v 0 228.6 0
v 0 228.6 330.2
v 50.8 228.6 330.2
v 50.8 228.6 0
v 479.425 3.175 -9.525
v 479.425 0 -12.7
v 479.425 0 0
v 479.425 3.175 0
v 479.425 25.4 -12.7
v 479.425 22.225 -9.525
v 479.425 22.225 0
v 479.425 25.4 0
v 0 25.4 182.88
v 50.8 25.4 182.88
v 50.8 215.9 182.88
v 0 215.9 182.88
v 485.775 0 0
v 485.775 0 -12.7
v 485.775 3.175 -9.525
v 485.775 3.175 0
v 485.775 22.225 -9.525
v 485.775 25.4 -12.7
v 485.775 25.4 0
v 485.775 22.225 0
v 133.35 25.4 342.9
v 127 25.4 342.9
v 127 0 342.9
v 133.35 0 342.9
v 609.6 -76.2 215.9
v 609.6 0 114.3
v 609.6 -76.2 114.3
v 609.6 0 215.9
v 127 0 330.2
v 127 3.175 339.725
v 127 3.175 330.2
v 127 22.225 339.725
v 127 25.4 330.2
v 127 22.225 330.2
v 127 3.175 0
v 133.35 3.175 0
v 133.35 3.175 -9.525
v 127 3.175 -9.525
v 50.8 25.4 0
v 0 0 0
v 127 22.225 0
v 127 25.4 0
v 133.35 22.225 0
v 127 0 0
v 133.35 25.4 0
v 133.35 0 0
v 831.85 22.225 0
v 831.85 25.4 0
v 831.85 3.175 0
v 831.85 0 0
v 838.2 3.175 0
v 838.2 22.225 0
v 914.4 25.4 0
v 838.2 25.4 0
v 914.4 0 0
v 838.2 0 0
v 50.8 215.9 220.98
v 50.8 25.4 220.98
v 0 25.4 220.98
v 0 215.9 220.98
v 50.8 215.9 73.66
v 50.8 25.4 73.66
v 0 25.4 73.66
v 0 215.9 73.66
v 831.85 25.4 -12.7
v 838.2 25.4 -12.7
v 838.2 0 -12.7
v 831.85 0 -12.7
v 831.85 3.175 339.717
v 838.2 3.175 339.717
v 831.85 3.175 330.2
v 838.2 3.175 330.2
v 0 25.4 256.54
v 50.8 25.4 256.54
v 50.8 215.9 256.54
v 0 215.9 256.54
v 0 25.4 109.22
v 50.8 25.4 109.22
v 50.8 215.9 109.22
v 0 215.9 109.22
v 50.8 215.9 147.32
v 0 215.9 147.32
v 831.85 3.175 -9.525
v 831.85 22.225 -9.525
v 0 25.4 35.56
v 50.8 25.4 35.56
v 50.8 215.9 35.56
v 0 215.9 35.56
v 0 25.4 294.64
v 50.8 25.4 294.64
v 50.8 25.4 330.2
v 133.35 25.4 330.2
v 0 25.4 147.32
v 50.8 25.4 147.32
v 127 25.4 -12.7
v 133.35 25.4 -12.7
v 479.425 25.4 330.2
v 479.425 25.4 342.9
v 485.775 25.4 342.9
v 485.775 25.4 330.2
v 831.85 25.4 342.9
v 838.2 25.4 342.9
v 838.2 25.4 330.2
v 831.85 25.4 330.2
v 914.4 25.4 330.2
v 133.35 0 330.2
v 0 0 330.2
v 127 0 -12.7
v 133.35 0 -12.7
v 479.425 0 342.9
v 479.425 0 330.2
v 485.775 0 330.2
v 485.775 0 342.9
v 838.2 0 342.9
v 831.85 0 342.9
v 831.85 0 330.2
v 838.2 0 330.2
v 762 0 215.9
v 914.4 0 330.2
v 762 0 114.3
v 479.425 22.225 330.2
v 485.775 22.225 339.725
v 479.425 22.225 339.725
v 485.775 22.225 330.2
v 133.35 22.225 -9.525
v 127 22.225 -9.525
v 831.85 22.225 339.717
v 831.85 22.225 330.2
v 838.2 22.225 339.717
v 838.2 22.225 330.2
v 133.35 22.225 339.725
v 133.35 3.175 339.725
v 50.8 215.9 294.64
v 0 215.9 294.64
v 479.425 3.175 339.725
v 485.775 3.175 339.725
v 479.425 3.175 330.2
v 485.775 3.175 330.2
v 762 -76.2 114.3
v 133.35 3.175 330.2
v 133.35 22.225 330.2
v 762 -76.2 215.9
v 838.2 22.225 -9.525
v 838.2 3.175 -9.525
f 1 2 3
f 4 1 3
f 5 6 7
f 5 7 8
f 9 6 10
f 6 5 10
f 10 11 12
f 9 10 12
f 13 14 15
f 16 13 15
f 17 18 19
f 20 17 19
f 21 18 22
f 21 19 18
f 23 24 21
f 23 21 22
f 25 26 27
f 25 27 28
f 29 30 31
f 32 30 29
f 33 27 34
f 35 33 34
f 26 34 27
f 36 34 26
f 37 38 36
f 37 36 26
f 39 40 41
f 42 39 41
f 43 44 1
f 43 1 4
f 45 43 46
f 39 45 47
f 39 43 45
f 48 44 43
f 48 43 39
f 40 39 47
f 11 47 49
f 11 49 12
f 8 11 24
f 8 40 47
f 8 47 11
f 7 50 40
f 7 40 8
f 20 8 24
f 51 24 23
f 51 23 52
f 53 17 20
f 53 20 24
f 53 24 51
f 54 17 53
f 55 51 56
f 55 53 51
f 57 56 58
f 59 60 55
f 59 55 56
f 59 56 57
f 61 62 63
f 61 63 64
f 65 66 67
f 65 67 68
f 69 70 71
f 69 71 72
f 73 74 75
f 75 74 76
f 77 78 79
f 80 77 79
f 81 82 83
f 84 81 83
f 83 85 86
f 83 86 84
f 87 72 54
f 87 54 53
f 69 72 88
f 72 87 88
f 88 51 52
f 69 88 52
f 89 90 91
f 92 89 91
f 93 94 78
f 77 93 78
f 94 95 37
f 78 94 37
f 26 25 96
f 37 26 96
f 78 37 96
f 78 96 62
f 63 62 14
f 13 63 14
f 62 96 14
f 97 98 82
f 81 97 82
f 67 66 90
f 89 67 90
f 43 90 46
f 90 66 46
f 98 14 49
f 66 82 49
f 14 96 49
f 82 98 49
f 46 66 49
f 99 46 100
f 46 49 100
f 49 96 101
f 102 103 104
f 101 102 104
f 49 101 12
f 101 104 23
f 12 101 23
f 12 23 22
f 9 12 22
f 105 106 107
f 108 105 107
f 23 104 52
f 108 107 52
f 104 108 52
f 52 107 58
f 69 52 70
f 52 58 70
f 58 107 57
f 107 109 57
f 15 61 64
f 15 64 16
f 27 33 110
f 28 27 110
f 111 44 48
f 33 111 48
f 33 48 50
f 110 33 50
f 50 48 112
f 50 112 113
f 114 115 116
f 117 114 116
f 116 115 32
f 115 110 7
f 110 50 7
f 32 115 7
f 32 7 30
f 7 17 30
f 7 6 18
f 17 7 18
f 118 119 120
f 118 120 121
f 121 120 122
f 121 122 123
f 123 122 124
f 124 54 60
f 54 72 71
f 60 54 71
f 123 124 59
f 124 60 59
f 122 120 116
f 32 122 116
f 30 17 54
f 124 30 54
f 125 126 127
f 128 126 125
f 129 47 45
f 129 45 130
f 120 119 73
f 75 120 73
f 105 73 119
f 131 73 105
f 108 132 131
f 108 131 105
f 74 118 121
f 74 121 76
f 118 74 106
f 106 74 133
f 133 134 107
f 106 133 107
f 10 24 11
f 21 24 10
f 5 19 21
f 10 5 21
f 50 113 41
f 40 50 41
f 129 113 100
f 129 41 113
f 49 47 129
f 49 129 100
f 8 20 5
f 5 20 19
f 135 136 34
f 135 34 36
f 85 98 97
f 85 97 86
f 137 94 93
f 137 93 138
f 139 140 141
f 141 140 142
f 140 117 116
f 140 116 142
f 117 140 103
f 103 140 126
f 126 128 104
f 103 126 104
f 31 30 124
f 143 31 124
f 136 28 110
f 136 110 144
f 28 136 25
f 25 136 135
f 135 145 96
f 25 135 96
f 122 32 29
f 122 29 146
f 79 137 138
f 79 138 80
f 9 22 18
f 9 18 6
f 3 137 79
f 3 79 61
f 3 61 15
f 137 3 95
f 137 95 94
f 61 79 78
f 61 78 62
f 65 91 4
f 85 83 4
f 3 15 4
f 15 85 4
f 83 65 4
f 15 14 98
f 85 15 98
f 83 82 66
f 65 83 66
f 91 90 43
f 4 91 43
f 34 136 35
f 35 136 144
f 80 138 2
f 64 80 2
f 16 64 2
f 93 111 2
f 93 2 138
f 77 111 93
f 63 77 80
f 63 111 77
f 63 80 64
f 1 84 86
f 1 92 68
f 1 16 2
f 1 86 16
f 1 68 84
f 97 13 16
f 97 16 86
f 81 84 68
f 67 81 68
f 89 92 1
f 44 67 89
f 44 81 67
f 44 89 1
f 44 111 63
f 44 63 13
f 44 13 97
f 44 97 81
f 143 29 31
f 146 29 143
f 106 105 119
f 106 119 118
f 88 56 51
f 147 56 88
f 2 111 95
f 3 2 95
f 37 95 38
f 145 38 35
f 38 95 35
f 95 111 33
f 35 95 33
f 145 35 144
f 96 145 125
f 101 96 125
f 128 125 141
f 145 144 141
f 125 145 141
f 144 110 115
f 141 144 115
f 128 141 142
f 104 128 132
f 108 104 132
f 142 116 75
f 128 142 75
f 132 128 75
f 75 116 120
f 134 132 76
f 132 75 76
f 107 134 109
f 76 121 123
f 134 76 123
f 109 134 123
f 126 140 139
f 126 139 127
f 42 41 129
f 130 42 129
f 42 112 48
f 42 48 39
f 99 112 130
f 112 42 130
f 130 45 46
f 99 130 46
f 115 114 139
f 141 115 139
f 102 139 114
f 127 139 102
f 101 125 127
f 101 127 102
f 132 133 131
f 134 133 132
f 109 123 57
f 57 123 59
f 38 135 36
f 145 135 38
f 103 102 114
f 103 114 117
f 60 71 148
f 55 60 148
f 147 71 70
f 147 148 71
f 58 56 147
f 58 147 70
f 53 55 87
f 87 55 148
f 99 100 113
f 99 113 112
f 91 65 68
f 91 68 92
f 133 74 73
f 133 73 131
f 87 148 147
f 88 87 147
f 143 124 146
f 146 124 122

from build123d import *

# Parameters (mm, degrees)
SKETCH1_W           = 914.4
SKETCH1_H           = 330.2
BOSS_EXTRUDE1_DEPTH = 25.4
SKETCH2_W           = 50.8
SKETCH2_H           = 330.2
BOSS_EXTRUDE2_DEPTH = 203.2
SKETCH5_W           = 6.35
SKETCH5_H           = 25.4
BOSS_EXTRUDE3_DEPTH = 12.7
SKETCH6_W           = 9.525
SKETCH6_H           = 19.05
CUT_EXTRUDE1_DEPTH  = 6.35
SKETCH7_W           = 9.525
SKETCH7_H           = 19.05
CUT_EXTRUDE2_DEPTH  = 6.35
SKETCH8_W           = 9.51738
SKETCH8_H           = 19.05
CUT_EXTRUDE3_DEPTH  = 6.35
SKETCH9_W           = 6.35
SKETCH9_H           = 25.4
BOSS_EXTRUDE4_DEPTH = 12.7
SKETCH10_W          = 9.525
SKETCH10_H          = 19.05
CUT_EXTRUDE4_DEPTH  = 6.35
SKETCH11_W          = 9.525
SKETCH11_H          = 19.05
CUT_EXTRUDE5_DEPTH  = 6.35
SKETCH12_W          = 9.525
SKETCH12_H          = 19.05
CUT_EXTRUDE6_DEPTH  = 6.35
SKETCH15_W          = 38.1
SKETCH15_H          = 190.5
CUT_EXTRUDE7_DEPTH  = 51.8
SKETCH16_W          = 152.4
SKETCH16_H          = 101.6
BOSS_EXTRUDE5_DEPTH = 76.2


with BuildPart() as part:
    # Sketch1 → Boss-Extrude1 (new body)
    with BuildSketch(Plane(origin=(0, 0, 0), x_dir=(1, 0, 0), z_dir=(0, 1, 0))):
        with Locations((457.2, -165.1)):
            Rectangle(SKETCH1_W, SKETCH1_H)
    extrude(amount=BOSS_EXTRUDE1_DEPTH)

    # Sketch2 → Boss-Extrude2 (add)
    with BuildSketch(Plane(origin=(0, 25.4, 0), x_dir=(1, 0, 0), z_dir=(0, 1, 0))):
        with Locations((25.4, -165.1)):
            Rectangle(SKETCH2_W, SKETCH2_H)
    extrude(amount=BOSS_EXTRUDE2_DEPTH)

    # Sketch5 → Boss-Extrude3 (add)
    with BuildSketch(Plane.XY.offset(330.2)):
        with Locations((130.175, 12.7)):
            Rectangle(SKETCH5_W, SKETCH5_H)
        with Locations((482.6, 12.7)):
            Rectangle(SKETCH5_W, SKETCH5_H)
        with Locations((835.025, 12.7)):
            Rectangle(SKETCH5_W, SKETCH5_H)
    extrude(amount=BOSS_EXTRUDE3_DEPTH)

    # Sketch6 → Cut-Extrude1 (cut)
    with BuildSketch(Plane(origin=(133.35, 0, 0), x_dir=(0, 0, -1), z_dir=(1, 0, 0))):
        with Locations((-334.9625, 12.7)):
            Rectangle(SKETCH6_W, SKETCH6_H)
    extrude(amount=-CUT_EXTRUDE1_DEPTH, mode=Mode.SUBTRACT)

    # Sketch7 → Cut-Extrude2 (cut)
    with BuildSketch(Plane(origin=(485.775, 0, 0), x_dir=(0, 0, -1), z_dir=(1, 0, 0))):
        with Locations((-334.9625, 12.7)):
            Rectangle(SKETCH7_W, SKETCH7_H)
    extrude(amount=-CUT_EXTRUDE2_DEPTH, mode=Mode.SUBTRACT)

    # Sketch8 → Cut-Extrude3 (cut)
    with BuildSketch(Plane(origin=(838.2, 0, 0), x_dir=(0, 0, -1), z_dir=(1, 0, 0))):
        with Locations((-334.95869, 12.7)):
            Rectangle(SKETCH8_W, SKETCH8_H)
    extrude(amount=-CUT_EXTRUDE3_DEPTH, mode=Mode.SUBTRACT)

    # Sketch9 → Boss-Extrude4 (add)
    with BuildSketch(Plane(origin=(0, 0, 0), x_dir=(-1, 0, 0), z_dir=(0, 0, -1))):
        with Locations((-835.025, 12.7)):
            Rectangle(SKETCH9_W, SKETCH9_H)
        with Locations((-482.6, 12.7)):
            Rectangle(SKETCH9_W, SKETCH9_H)
        with Locations((-130.175, 12.7)):
            Rectangle(SKETCH9_W, SKETCH9_H)
    extrude(amount=BOSS_EXTRUDE4_DEPTH)

    # Sketch10 → Cut-Extrude4 (cut)
    with BuildSketch(Plane(origin=(133.35, 0, 0), x_dir=(0, 0, -1), z_dir=(1, 0, 0))):
        with Locations((4.7625, 12.7)):
            Rectangle(SKETCH10_W, SKETCH10_H)
    extrude(amount=-CUT_EXTRUDE4_DEPTH, mode=Mode.SUBTRACT)

    # Sketch11 → Cut-Extrude5 (cut)
    with BuildSketch(Plane(origin=(485.775, 0, 0), x_dir=(0, 0, -1), z_dir=(1, 0, 0))):
        with Locations((4.7625, 12.7)):
            Rectangle(SKETCH11_W, SKETCH11_H)
    extrude(amount=-CUT_EXTRUDE5_DEPTH, mode=Mode.SUBTRACT)

    # Sketch12 → Cut-Extrude6 (cut)
    with BuildSketch(Plane(origin=(838.2, 0, 0), x_dir=(0, 0, -1), z_dir=(1, 0, 0))):
        with Locations((4.7625, 12.7)):
            Rectangle(SKETCH12_W, SKETCH12_H)
    extrude(amount=-CUT_EXTRUDE6_DEPTH, mode=Mode.SUBTRACT)

    # Sketch15 → Cut-Extrude7 (cut, through all)
    with BuildSketch(Plane(origin=(50.8, 0, 0), x_dir=(0, 0, -1), z_dir=(1, 0, 0))):
        with Locations((-275.59, 120.65)):
            Rectangle(SKETCH15_W, SKETCH15_H)
        with Locations((-201.93, 120.65)):
            Rectangle(SKETCH15_W, SKETCH15_H)
        with Locations((-128.27, 120.65)):
            Rectangle(SKETCH15_W, SKETCH15_H)
        with Locations((-54.61, 120.65)):
            Rectangle(SKETCH15_W, SKETCH15_H)
    extrude(amount=-CUT_EXTRUDE7_DEPTH, mode=Mode.SUBTRACT)

    # Sketch16 → Boss-Extrude5 (add)
    with BuildSketch(Plane.XZ):
        with Locations((685.8, 165.1)):
            Rectangle(SKETCH16_W, SKETCH16_H)
    extrude(amount=BOSS_EXTRUDE5_DEPTH)


solid = part.part
